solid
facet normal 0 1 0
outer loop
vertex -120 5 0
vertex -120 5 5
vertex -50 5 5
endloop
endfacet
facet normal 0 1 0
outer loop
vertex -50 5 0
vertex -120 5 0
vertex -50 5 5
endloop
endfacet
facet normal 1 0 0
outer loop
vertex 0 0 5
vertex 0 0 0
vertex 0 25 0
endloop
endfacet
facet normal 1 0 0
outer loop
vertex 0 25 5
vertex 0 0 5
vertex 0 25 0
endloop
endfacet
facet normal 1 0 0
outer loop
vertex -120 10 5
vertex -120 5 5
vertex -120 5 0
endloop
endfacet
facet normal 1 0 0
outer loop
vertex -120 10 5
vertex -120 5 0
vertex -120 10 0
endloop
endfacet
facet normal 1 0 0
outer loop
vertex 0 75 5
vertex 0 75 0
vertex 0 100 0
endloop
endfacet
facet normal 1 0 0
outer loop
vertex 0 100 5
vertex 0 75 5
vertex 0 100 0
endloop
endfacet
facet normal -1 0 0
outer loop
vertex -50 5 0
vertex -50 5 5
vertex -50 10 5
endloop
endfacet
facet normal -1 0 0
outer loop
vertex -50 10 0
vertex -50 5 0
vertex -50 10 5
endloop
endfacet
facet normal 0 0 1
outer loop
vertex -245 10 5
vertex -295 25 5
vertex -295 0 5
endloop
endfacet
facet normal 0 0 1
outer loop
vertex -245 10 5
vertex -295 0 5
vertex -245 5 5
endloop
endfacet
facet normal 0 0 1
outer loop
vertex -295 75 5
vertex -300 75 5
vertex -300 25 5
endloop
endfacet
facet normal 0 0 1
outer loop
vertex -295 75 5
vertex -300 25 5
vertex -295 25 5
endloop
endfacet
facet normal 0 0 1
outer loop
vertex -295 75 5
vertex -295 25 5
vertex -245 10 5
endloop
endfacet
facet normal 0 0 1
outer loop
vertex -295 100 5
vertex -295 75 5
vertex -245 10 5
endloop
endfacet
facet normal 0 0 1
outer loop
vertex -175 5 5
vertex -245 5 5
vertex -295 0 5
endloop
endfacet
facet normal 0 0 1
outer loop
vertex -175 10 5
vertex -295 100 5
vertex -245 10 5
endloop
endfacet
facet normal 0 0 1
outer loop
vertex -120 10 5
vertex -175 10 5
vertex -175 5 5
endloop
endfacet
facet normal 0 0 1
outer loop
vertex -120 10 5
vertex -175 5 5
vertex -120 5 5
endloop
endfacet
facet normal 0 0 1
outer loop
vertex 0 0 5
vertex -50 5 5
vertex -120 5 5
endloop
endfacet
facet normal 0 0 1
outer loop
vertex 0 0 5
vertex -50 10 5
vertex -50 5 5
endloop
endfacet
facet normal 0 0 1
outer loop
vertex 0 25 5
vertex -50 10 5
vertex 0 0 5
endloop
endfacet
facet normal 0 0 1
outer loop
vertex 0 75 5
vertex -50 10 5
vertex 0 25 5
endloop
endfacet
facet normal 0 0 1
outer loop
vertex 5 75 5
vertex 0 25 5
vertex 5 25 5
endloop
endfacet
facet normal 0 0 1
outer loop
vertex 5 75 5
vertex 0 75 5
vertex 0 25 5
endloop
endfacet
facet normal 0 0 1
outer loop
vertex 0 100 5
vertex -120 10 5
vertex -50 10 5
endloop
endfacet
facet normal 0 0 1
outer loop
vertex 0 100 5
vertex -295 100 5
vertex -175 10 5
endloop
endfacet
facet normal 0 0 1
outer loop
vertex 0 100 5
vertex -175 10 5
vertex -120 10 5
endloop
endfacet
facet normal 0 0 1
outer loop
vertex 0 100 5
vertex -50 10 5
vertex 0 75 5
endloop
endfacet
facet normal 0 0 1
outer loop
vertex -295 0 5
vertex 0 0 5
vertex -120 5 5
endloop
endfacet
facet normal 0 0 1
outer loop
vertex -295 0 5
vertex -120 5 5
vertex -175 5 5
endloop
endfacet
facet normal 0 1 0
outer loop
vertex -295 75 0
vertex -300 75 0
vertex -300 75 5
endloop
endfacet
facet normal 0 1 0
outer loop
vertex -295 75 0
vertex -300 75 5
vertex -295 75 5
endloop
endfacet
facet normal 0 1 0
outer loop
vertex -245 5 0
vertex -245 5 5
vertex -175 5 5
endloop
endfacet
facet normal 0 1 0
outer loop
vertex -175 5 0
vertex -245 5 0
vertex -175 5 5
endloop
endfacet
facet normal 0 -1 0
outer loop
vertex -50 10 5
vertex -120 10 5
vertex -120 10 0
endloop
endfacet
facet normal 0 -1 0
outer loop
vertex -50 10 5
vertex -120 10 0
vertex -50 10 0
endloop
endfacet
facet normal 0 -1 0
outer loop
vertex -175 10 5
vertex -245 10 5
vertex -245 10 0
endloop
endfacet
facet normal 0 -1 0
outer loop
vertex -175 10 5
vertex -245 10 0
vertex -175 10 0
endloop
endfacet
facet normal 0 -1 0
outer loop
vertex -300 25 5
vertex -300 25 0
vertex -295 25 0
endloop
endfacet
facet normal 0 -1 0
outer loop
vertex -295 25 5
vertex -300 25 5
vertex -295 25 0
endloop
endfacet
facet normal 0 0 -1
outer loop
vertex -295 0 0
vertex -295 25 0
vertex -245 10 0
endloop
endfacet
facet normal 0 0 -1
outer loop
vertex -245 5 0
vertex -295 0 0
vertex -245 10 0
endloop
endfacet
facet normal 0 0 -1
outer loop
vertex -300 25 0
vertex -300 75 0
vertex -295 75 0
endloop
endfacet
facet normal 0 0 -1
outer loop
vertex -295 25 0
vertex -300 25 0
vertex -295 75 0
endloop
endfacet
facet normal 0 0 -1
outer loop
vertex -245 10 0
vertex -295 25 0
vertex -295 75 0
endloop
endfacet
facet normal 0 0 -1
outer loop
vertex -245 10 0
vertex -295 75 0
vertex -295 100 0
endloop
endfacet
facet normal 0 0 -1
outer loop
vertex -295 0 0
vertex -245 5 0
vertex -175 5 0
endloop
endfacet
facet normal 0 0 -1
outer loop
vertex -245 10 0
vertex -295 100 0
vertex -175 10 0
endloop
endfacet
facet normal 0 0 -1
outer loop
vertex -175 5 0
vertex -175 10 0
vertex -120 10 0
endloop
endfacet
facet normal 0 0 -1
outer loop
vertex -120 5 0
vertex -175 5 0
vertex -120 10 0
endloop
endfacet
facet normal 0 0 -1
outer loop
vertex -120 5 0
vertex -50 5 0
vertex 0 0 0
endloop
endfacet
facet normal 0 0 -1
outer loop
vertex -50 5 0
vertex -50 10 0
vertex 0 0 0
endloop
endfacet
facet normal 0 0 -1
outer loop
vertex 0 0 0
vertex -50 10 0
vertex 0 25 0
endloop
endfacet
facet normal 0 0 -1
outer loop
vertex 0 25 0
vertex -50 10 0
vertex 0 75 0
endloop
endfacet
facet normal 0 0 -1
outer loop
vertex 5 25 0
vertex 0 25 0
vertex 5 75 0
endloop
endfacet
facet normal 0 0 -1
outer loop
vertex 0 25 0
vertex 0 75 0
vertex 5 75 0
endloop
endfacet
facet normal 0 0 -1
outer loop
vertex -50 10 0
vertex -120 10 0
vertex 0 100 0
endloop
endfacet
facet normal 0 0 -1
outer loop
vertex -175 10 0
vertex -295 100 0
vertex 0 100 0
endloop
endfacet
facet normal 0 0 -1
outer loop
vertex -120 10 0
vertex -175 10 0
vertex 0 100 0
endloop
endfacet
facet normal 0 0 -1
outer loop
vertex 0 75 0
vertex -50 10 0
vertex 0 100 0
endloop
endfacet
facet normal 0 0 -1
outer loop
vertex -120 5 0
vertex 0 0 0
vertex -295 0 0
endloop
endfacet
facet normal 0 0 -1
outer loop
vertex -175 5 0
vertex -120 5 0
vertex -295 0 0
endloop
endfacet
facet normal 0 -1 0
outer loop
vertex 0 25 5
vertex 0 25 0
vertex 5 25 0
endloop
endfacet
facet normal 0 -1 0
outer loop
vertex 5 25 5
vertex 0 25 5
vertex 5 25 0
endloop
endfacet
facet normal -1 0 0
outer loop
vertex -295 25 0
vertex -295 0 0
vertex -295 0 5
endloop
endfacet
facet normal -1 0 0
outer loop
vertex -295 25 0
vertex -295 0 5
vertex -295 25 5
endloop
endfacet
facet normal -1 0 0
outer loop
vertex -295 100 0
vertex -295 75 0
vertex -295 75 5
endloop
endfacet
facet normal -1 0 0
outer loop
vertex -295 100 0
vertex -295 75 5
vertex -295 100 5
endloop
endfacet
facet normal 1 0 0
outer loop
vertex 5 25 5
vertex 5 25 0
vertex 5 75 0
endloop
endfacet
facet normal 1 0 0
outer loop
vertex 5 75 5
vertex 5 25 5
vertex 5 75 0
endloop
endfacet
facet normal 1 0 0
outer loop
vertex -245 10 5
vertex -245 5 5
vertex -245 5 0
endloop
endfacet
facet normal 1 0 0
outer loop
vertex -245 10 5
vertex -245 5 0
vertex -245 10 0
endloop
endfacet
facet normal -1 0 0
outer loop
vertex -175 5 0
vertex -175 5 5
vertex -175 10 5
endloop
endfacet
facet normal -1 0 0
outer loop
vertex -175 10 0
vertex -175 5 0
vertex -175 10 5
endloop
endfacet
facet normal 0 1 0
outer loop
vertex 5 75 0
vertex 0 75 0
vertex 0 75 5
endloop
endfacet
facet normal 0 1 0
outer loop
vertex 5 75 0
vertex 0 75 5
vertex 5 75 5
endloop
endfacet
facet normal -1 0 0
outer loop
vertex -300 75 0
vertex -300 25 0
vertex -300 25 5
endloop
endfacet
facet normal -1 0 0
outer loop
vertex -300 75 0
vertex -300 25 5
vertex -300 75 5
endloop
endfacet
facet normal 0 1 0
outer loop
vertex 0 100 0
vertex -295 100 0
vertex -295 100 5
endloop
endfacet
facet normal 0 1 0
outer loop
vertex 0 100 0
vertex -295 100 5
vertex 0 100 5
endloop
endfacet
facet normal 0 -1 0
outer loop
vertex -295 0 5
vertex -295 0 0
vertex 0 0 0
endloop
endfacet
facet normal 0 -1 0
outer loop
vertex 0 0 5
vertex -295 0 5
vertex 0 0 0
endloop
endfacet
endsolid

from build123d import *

# Parameters (mm, degrees)
SKETCH1_W           = 295
SKETCH1_H           = 100
SKETCH1_W_2         = 5
SKETCH1_H_2         = 50
BOSS_EXTRUDE1_DEPTH = 5
SKETCH2_W           = 70
SKETCH2_H           = 5
CUT_EXTRUDE1_DEPTH  = 5


with BuildPart() as part:
    # Sketch1 → Boss-Extrude1 (new body)
    with BuildSketch(Plane.XY):
        with Locations((-147.5, 50)):
            Rectangle(SKETCH1_W, SKETCH1_H)
        with Locations((2.5, 50)):
            Rectangle(SKETCH1_W_2, SKETCH1_H_2)
        with Locations((-297.5, 50)):
            Rectangle(SKETCH1_W_2, SKETCH1_H_2)
    extrude(amount=BOSS_EXTRUDE1_DEPTH)

    # Sketch2 → Cut-Extrude1 (cut)
    with BuildSketch(Plane.XY.offset(5)):
        with Locations((-210, 7.5)):
            Rectangle(SKETCH2_W, SKETCH2_H)
        with Locations((-85, 7.5)):
            Rectangle(SKETCH2_W, SKETCH2_H)
    extrude(amount=-CUT_EXTRUDE1_DEPTH, mode=Mode.SUBTRACT)


solid = part.part
